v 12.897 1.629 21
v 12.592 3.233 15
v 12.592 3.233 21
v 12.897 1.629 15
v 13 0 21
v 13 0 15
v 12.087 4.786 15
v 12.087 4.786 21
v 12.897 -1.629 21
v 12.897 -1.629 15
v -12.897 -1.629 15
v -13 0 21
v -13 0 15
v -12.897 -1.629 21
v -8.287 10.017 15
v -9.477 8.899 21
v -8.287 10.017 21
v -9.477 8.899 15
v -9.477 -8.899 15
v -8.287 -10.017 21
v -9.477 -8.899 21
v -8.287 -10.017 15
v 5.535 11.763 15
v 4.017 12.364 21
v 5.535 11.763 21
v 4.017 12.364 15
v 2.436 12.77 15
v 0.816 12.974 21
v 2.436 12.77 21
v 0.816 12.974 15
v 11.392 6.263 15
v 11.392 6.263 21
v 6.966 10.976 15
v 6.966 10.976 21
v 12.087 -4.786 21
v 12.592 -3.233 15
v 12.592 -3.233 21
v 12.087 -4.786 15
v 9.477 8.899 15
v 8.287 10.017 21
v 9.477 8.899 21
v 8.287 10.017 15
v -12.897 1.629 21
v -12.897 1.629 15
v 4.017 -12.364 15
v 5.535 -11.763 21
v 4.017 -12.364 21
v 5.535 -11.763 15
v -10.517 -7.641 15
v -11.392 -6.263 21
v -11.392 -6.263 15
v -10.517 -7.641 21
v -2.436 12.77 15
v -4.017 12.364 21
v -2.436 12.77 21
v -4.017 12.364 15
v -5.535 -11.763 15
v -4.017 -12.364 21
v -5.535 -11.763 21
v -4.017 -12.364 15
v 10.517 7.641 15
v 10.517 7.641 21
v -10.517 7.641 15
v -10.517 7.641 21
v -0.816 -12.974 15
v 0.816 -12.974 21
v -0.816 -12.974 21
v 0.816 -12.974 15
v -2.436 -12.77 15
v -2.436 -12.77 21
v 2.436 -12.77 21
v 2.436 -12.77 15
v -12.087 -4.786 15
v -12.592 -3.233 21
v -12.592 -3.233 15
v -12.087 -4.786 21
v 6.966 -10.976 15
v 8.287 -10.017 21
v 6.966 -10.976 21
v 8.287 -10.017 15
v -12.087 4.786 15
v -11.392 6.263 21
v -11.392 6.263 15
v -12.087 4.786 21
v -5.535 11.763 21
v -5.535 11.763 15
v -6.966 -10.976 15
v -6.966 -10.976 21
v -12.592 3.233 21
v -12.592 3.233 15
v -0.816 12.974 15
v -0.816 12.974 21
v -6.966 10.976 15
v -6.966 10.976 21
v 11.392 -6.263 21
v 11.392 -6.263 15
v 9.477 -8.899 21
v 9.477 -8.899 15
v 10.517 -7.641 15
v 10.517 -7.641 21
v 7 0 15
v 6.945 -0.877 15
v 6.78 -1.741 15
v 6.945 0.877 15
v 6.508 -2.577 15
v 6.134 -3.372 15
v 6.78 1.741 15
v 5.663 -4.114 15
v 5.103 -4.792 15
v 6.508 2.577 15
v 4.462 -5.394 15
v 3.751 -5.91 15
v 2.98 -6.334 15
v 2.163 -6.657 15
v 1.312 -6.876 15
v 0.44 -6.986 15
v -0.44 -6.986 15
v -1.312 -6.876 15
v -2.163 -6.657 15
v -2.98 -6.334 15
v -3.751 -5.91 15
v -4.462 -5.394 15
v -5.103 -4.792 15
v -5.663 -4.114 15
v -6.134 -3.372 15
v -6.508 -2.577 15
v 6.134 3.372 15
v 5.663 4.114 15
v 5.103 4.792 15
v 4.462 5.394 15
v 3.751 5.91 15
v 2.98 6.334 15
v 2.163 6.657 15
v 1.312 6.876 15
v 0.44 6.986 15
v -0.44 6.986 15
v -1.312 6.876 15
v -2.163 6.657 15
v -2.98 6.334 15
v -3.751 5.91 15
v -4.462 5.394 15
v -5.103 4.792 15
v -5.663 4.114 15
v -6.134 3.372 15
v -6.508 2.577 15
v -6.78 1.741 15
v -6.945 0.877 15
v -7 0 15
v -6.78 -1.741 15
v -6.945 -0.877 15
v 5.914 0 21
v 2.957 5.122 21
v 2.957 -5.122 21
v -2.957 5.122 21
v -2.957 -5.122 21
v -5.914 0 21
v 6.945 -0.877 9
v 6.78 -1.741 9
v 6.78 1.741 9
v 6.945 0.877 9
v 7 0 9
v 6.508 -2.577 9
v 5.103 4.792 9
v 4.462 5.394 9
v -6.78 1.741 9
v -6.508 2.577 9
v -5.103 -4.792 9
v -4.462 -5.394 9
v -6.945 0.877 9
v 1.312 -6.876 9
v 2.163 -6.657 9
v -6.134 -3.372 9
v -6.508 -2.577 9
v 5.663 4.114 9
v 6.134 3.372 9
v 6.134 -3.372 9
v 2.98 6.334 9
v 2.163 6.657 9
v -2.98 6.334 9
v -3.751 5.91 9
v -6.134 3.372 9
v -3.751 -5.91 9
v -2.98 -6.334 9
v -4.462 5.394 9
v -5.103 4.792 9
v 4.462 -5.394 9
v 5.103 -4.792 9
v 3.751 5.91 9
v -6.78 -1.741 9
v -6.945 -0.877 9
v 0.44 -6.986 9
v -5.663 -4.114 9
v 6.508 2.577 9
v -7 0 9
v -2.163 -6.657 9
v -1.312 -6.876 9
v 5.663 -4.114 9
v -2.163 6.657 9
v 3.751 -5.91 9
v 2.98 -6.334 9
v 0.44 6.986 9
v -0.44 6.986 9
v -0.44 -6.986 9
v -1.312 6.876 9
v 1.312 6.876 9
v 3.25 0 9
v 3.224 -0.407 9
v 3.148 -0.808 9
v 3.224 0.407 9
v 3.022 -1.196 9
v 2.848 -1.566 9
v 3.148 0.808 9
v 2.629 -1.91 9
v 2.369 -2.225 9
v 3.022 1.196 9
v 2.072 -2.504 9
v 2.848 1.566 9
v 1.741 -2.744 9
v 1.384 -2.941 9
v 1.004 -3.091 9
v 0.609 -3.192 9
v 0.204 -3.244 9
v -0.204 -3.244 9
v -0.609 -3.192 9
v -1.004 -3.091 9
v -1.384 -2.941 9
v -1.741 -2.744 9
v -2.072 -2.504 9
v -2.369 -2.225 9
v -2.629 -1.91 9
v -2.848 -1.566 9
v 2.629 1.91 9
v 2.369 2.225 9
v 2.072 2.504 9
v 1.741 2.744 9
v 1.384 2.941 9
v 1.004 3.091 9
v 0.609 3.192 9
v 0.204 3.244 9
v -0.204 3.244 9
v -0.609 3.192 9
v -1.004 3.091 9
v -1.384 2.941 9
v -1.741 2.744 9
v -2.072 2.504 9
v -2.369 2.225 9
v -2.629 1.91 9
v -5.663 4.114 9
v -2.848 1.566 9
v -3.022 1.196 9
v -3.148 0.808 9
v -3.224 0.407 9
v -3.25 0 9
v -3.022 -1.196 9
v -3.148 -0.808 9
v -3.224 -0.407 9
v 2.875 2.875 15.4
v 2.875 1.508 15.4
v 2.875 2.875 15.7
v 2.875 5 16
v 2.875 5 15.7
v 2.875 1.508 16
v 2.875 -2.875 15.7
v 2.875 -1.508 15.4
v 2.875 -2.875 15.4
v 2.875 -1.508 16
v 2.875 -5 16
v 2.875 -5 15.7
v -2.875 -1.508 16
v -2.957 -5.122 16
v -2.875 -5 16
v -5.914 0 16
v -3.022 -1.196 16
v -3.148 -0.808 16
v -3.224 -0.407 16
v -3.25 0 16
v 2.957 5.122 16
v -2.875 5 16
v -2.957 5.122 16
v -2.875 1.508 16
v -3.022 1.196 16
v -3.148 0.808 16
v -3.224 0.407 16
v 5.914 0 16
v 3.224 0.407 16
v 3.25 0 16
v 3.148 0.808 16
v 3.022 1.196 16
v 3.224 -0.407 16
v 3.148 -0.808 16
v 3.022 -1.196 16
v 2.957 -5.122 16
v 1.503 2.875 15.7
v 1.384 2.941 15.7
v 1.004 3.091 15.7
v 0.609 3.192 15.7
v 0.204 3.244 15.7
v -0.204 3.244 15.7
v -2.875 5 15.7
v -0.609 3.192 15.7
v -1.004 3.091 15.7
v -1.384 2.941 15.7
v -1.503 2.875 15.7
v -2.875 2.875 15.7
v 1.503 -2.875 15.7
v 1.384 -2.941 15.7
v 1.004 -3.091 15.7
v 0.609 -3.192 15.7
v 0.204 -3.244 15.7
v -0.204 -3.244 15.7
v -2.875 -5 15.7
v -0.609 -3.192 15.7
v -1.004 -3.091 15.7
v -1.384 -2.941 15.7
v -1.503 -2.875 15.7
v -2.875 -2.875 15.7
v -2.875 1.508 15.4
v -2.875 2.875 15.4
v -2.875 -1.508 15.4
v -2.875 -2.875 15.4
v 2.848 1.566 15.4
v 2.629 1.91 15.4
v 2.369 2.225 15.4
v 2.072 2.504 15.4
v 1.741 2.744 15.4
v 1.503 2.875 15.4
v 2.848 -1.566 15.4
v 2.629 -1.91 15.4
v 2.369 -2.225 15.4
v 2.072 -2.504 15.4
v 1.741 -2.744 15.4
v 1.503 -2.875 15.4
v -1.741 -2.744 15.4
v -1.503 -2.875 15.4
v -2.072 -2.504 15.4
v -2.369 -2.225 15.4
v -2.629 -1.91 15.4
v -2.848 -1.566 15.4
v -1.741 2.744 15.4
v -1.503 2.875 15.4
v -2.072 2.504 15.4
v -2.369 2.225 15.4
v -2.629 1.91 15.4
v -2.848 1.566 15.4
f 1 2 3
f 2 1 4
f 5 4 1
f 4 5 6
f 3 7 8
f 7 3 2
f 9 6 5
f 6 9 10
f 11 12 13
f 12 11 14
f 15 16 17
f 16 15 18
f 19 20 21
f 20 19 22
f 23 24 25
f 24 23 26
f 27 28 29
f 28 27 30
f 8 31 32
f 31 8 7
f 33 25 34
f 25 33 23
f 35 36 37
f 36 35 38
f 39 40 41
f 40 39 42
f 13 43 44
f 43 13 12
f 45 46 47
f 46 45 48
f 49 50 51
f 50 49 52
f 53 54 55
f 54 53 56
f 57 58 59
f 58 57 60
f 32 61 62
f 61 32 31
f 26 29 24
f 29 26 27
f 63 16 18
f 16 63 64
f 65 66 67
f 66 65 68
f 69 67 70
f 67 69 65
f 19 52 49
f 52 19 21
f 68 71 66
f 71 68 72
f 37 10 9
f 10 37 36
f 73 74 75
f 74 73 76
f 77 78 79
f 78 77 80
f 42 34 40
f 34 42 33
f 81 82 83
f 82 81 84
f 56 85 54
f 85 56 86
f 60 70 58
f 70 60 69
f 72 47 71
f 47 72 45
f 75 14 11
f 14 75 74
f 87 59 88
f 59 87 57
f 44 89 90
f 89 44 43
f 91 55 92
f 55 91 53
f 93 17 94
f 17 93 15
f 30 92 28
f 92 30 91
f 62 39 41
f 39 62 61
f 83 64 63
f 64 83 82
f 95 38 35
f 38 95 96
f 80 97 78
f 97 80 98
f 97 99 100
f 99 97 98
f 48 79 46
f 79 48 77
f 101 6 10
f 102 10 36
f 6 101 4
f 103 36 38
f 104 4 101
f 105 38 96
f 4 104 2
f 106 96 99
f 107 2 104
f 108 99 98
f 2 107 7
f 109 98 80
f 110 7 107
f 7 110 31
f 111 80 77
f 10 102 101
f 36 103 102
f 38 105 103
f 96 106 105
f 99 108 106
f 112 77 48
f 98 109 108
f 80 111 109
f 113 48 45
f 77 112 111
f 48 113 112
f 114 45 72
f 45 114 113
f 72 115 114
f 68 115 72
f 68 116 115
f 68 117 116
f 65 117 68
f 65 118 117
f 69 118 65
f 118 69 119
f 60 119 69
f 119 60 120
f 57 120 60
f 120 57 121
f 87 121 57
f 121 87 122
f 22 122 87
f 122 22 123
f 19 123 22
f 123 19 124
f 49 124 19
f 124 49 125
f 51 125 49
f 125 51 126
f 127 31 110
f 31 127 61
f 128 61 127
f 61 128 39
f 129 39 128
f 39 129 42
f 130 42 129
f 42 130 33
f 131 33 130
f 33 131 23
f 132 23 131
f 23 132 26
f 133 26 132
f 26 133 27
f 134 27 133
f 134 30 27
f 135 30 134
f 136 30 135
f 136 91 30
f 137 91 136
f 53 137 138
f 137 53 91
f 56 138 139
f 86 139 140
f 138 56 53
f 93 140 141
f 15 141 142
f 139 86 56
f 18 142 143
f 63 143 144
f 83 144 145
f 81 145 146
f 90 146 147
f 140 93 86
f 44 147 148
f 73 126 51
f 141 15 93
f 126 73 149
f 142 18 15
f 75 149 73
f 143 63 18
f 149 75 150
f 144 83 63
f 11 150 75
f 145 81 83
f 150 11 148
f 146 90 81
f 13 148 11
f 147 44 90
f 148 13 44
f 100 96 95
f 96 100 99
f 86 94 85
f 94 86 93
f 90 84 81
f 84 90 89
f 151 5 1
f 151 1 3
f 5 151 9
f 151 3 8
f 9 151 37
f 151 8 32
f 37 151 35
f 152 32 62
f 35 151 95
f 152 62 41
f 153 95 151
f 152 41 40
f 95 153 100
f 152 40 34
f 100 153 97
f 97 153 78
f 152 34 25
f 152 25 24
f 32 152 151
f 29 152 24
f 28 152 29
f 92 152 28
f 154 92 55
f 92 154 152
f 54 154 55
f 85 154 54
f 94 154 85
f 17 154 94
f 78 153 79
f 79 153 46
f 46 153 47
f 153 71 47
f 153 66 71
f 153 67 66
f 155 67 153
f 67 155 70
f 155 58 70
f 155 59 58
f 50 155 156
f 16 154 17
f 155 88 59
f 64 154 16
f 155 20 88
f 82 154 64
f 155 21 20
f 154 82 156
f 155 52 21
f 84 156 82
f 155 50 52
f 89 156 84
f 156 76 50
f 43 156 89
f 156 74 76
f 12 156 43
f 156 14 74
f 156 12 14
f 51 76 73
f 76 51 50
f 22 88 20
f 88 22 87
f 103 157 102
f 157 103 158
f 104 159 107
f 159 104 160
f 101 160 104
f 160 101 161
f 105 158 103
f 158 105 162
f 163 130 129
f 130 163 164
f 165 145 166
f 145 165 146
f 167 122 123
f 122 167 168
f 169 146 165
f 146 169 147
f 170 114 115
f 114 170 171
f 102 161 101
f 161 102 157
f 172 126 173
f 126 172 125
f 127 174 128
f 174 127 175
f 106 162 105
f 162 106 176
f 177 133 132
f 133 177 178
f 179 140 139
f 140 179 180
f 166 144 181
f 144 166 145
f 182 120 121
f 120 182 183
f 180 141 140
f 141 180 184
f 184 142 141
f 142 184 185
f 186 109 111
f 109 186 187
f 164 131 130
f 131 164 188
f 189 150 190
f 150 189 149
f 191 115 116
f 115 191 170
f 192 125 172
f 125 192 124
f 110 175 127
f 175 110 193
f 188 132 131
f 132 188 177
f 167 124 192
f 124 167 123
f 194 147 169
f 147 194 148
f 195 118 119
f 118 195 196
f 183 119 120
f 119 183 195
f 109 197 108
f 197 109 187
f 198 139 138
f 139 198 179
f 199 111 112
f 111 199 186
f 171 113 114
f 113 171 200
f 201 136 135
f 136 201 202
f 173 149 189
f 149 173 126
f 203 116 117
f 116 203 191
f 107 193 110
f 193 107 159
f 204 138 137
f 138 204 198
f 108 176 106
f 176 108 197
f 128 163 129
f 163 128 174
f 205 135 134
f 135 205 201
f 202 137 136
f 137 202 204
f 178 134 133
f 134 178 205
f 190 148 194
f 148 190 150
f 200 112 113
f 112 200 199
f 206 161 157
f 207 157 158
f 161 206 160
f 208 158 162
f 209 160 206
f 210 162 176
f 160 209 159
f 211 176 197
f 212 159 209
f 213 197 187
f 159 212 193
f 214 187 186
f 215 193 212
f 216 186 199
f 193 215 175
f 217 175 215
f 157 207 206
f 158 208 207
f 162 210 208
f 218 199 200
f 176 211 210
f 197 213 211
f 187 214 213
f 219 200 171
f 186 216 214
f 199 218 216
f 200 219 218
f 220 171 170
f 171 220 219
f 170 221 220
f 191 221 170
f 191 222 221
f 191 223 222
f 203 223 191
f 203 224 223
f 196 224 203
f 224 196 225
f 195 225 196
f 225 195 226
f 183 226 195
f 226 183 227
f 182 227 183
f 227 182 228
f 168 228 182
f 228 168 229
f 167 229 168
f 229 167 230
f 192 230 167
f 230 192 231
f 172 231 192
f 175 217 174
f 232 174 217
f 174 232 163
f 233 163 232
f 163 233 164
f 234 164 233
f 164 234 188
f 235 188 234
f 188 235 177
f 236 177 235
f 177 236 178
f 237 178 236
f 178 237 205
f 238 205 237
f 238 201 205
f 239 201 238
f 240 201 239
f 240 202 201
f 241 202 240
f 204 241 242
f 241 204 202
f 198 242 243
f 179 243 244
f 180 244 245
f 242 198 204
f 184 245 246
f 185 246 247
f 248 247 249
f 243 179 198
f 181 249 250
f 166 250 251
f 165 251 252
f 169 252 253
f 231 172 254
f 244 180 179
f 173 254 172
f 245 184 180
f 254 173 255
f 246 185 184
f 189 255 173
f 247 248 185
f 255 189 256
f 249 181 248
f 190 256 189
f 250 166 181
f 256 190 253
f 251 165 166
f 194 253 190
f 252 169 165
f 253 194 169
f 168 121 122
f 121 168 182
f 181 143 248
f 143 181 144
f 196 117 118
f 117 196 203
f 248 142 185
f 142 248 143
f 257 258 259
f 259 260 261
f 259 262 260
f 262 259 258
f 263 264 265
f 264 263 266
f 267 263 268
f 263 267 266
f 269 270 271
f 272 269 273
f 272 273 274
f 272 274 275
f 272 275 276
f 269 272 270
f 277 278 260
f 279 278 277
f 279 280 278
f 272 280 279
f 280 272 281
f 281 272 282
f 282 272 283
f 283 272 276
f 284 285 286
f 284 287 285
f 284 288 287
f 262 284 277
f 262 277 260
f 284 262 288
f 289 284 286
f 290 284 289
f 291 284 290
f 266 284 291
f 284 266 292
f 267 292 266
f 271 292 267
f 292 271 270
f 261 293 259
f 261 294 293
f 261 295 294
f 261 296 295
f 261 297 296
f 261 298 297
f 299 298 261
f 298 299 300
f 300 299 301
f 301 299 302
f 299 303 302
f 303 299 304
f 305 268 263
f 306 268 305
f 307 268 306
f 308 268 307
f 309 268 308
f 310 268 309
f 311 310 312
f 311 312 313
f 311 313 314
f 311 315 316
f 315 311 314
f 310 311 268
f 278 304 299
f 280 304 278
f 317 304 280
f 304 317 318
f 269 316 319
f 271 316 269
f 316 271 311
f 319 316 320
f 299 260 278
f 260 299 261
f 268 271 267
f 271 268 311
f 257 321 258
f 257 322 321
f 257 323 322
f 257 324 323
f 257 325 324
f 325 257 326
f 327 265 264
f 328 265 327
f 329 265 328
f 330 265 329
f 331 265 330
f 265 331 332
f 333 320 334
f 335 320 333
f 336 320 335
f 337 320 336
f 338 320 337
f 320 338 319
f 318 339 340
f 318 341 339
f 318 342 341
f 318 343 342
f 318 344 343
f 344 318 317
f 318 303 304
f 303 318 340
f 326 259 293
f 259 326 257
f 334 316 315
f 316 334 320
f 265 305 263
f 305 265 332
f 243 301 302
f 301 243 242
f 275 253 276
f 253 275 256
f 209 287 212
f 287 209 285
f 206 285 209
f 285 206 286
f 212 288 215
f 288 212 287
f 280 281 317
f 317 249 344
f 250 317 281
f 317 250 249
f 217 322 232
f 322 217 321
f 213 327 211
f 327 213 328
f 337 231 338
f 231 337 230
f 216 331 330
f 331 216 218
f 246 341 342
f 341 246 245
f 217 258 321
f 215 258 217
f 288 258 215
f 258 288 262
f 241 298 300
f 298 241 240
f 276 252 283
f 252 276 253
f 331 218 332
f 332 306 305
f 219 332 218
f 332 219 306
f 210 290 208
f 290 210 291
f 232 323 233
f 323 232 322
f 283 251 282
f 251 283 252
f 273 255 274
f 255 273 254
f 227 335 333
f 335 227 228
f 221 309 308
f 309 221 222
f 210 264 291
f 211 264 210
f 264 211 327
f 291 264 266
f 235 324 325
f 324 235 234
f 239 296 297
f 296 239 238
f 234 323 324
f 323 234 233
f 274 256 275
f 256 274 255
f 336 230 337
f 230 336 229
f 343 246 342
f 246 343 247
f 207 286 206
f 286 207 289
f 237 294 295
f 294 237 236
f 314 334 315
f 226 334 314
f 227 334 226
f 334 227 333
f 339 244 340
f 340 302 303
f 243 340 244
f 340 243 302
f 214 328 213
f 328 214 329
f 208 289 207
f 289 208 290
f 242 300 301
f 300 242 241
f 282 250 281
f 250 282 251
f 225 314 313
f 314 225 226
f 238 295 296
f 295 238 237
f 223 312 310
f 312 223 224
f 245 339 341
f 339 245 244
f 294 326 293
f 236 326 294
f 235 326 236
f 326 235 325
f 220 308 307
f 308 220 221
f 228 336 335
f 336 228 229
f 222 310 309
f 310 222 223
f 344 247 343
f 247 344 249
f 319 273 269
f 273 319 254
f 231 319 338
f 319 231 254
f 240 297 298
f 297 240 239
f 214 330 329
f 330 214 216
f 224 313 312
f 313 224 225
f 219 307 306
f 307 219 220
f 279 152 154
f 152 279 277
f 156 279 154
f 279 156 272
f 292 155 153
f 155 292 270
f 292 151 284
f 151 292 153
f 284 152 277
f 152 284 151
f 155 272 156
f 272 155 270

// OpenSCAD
$fn = 50;


difference() {
	union() {
		translate(v = [0, 0, 15.0000000000]) {
			cylinder(h = 6, r = 13.0000000000);
		}
		translate(v = [0, 0, 9.0000000000]) {
			cylinder(h = 12, r = 7.0000000000);
		}
	}
	union() {
		translate(v = [0, 0, 21]) {
			rotate(a = [0, 0, 0]) {
				difference() {
					union() {
						#translate(v = [-2.8750000000, -5.0000000000, -5.3000000000]) {
							cube(size = [5.7500000000, 10, 0.3000000000]);
						}
						#translate(v = [-2.8750000000, -2.8750000000, -5.6000000000]) {
							cube(size = [5.7500000000, 5.7500000000, 0.3000000000]);
						}
						#translate(v = [-2.8750000000, -5.0000000000, 0]) {
							cube(size = [5.7500000000, 10, 0.3000000000]);
						}
						#translate(v = [-2.8750000000, -2.8750000000, 0.3000000000]) {
							cube(size = [5.7500000000, 5.7500000000, 0.3000000000]);
						}
						#translate(v = [0, 0, -100.0000000000]) {
							cylinder(h = 200, r = 3.2500000000);
						}
						translate(v = [0, 0, -5]) {
							#linear_extrude(height = 5) {
								polygon(points = [[5.9142500000, 0.0000000000], [2.9571250000, 5.1218907443], [-2.9571250000, 5.1218907443], [-5.9142500000, 0.0000000000], [-2.9571250000, -5.1218907443], [2.9571250000, -5.1218907443]]);
							}
						}
						#translate(v = [-2.8750000000, -5.0000000000, -5.3000000000]) {
							cube(size = [5.7500000000, 10, 0.3000000000]);
						}
						#translate(v = [-2.8750000000, -2.8750000000, -5.6000000000]) {
							cube(size = [5.7500000000, 5.7500000000, 0.3000000000]);
						}
						#translate(v = [-2.8750000000, -5.0000000000, 0]) {
							cube(size = [5.7500000000, 10, 0.3000000000]);
						}
						#translate(v = [-2.8750000000, -2.8750000000, 0.3000000000]) {
							cube(size = [5.7500000000, 5.7500000000, 0.3000000000]);
						}
						#translate(v = [0, 0, -100.0000000000]) {
							cylinder(h = 200, r = 3.2500000000);
						}
						#translate(v = [-2.8750000000, -5.0000000000, -5.3000000000]) {
							cube(size = [5.7500000000, 10, 0.3000000000]);
						}
						#translate(v = [-2.8750000000, -2.8750000000, -5.6000000000]) {
							cube(size = [5.7500000000, 5.7500000000, 0.3000000000]);
						}
						#translate(v = [-2.8750000000, -5.0000000000, 0]) {
							cube(size = [5.7500000000, 10, 0.3000000000]);
						}
						#translate(v = [-2.8750000000, -2.8750000000, 0.3000000000]) {
							cube(size = [5.7500000000, 5.7500000000, 0.3000000000]);
						}
						#translate(v = [0, 0, -100.0000000000]) {
							cylinder(h = 200, r = 3.2500000000);
						}
					}
					union();
				}
			}
		}
		#translate(v = [0, 0, -100.0000000000]) {
			cylinder(h = 200, r = 3.2500000000);
		}
	}
}
